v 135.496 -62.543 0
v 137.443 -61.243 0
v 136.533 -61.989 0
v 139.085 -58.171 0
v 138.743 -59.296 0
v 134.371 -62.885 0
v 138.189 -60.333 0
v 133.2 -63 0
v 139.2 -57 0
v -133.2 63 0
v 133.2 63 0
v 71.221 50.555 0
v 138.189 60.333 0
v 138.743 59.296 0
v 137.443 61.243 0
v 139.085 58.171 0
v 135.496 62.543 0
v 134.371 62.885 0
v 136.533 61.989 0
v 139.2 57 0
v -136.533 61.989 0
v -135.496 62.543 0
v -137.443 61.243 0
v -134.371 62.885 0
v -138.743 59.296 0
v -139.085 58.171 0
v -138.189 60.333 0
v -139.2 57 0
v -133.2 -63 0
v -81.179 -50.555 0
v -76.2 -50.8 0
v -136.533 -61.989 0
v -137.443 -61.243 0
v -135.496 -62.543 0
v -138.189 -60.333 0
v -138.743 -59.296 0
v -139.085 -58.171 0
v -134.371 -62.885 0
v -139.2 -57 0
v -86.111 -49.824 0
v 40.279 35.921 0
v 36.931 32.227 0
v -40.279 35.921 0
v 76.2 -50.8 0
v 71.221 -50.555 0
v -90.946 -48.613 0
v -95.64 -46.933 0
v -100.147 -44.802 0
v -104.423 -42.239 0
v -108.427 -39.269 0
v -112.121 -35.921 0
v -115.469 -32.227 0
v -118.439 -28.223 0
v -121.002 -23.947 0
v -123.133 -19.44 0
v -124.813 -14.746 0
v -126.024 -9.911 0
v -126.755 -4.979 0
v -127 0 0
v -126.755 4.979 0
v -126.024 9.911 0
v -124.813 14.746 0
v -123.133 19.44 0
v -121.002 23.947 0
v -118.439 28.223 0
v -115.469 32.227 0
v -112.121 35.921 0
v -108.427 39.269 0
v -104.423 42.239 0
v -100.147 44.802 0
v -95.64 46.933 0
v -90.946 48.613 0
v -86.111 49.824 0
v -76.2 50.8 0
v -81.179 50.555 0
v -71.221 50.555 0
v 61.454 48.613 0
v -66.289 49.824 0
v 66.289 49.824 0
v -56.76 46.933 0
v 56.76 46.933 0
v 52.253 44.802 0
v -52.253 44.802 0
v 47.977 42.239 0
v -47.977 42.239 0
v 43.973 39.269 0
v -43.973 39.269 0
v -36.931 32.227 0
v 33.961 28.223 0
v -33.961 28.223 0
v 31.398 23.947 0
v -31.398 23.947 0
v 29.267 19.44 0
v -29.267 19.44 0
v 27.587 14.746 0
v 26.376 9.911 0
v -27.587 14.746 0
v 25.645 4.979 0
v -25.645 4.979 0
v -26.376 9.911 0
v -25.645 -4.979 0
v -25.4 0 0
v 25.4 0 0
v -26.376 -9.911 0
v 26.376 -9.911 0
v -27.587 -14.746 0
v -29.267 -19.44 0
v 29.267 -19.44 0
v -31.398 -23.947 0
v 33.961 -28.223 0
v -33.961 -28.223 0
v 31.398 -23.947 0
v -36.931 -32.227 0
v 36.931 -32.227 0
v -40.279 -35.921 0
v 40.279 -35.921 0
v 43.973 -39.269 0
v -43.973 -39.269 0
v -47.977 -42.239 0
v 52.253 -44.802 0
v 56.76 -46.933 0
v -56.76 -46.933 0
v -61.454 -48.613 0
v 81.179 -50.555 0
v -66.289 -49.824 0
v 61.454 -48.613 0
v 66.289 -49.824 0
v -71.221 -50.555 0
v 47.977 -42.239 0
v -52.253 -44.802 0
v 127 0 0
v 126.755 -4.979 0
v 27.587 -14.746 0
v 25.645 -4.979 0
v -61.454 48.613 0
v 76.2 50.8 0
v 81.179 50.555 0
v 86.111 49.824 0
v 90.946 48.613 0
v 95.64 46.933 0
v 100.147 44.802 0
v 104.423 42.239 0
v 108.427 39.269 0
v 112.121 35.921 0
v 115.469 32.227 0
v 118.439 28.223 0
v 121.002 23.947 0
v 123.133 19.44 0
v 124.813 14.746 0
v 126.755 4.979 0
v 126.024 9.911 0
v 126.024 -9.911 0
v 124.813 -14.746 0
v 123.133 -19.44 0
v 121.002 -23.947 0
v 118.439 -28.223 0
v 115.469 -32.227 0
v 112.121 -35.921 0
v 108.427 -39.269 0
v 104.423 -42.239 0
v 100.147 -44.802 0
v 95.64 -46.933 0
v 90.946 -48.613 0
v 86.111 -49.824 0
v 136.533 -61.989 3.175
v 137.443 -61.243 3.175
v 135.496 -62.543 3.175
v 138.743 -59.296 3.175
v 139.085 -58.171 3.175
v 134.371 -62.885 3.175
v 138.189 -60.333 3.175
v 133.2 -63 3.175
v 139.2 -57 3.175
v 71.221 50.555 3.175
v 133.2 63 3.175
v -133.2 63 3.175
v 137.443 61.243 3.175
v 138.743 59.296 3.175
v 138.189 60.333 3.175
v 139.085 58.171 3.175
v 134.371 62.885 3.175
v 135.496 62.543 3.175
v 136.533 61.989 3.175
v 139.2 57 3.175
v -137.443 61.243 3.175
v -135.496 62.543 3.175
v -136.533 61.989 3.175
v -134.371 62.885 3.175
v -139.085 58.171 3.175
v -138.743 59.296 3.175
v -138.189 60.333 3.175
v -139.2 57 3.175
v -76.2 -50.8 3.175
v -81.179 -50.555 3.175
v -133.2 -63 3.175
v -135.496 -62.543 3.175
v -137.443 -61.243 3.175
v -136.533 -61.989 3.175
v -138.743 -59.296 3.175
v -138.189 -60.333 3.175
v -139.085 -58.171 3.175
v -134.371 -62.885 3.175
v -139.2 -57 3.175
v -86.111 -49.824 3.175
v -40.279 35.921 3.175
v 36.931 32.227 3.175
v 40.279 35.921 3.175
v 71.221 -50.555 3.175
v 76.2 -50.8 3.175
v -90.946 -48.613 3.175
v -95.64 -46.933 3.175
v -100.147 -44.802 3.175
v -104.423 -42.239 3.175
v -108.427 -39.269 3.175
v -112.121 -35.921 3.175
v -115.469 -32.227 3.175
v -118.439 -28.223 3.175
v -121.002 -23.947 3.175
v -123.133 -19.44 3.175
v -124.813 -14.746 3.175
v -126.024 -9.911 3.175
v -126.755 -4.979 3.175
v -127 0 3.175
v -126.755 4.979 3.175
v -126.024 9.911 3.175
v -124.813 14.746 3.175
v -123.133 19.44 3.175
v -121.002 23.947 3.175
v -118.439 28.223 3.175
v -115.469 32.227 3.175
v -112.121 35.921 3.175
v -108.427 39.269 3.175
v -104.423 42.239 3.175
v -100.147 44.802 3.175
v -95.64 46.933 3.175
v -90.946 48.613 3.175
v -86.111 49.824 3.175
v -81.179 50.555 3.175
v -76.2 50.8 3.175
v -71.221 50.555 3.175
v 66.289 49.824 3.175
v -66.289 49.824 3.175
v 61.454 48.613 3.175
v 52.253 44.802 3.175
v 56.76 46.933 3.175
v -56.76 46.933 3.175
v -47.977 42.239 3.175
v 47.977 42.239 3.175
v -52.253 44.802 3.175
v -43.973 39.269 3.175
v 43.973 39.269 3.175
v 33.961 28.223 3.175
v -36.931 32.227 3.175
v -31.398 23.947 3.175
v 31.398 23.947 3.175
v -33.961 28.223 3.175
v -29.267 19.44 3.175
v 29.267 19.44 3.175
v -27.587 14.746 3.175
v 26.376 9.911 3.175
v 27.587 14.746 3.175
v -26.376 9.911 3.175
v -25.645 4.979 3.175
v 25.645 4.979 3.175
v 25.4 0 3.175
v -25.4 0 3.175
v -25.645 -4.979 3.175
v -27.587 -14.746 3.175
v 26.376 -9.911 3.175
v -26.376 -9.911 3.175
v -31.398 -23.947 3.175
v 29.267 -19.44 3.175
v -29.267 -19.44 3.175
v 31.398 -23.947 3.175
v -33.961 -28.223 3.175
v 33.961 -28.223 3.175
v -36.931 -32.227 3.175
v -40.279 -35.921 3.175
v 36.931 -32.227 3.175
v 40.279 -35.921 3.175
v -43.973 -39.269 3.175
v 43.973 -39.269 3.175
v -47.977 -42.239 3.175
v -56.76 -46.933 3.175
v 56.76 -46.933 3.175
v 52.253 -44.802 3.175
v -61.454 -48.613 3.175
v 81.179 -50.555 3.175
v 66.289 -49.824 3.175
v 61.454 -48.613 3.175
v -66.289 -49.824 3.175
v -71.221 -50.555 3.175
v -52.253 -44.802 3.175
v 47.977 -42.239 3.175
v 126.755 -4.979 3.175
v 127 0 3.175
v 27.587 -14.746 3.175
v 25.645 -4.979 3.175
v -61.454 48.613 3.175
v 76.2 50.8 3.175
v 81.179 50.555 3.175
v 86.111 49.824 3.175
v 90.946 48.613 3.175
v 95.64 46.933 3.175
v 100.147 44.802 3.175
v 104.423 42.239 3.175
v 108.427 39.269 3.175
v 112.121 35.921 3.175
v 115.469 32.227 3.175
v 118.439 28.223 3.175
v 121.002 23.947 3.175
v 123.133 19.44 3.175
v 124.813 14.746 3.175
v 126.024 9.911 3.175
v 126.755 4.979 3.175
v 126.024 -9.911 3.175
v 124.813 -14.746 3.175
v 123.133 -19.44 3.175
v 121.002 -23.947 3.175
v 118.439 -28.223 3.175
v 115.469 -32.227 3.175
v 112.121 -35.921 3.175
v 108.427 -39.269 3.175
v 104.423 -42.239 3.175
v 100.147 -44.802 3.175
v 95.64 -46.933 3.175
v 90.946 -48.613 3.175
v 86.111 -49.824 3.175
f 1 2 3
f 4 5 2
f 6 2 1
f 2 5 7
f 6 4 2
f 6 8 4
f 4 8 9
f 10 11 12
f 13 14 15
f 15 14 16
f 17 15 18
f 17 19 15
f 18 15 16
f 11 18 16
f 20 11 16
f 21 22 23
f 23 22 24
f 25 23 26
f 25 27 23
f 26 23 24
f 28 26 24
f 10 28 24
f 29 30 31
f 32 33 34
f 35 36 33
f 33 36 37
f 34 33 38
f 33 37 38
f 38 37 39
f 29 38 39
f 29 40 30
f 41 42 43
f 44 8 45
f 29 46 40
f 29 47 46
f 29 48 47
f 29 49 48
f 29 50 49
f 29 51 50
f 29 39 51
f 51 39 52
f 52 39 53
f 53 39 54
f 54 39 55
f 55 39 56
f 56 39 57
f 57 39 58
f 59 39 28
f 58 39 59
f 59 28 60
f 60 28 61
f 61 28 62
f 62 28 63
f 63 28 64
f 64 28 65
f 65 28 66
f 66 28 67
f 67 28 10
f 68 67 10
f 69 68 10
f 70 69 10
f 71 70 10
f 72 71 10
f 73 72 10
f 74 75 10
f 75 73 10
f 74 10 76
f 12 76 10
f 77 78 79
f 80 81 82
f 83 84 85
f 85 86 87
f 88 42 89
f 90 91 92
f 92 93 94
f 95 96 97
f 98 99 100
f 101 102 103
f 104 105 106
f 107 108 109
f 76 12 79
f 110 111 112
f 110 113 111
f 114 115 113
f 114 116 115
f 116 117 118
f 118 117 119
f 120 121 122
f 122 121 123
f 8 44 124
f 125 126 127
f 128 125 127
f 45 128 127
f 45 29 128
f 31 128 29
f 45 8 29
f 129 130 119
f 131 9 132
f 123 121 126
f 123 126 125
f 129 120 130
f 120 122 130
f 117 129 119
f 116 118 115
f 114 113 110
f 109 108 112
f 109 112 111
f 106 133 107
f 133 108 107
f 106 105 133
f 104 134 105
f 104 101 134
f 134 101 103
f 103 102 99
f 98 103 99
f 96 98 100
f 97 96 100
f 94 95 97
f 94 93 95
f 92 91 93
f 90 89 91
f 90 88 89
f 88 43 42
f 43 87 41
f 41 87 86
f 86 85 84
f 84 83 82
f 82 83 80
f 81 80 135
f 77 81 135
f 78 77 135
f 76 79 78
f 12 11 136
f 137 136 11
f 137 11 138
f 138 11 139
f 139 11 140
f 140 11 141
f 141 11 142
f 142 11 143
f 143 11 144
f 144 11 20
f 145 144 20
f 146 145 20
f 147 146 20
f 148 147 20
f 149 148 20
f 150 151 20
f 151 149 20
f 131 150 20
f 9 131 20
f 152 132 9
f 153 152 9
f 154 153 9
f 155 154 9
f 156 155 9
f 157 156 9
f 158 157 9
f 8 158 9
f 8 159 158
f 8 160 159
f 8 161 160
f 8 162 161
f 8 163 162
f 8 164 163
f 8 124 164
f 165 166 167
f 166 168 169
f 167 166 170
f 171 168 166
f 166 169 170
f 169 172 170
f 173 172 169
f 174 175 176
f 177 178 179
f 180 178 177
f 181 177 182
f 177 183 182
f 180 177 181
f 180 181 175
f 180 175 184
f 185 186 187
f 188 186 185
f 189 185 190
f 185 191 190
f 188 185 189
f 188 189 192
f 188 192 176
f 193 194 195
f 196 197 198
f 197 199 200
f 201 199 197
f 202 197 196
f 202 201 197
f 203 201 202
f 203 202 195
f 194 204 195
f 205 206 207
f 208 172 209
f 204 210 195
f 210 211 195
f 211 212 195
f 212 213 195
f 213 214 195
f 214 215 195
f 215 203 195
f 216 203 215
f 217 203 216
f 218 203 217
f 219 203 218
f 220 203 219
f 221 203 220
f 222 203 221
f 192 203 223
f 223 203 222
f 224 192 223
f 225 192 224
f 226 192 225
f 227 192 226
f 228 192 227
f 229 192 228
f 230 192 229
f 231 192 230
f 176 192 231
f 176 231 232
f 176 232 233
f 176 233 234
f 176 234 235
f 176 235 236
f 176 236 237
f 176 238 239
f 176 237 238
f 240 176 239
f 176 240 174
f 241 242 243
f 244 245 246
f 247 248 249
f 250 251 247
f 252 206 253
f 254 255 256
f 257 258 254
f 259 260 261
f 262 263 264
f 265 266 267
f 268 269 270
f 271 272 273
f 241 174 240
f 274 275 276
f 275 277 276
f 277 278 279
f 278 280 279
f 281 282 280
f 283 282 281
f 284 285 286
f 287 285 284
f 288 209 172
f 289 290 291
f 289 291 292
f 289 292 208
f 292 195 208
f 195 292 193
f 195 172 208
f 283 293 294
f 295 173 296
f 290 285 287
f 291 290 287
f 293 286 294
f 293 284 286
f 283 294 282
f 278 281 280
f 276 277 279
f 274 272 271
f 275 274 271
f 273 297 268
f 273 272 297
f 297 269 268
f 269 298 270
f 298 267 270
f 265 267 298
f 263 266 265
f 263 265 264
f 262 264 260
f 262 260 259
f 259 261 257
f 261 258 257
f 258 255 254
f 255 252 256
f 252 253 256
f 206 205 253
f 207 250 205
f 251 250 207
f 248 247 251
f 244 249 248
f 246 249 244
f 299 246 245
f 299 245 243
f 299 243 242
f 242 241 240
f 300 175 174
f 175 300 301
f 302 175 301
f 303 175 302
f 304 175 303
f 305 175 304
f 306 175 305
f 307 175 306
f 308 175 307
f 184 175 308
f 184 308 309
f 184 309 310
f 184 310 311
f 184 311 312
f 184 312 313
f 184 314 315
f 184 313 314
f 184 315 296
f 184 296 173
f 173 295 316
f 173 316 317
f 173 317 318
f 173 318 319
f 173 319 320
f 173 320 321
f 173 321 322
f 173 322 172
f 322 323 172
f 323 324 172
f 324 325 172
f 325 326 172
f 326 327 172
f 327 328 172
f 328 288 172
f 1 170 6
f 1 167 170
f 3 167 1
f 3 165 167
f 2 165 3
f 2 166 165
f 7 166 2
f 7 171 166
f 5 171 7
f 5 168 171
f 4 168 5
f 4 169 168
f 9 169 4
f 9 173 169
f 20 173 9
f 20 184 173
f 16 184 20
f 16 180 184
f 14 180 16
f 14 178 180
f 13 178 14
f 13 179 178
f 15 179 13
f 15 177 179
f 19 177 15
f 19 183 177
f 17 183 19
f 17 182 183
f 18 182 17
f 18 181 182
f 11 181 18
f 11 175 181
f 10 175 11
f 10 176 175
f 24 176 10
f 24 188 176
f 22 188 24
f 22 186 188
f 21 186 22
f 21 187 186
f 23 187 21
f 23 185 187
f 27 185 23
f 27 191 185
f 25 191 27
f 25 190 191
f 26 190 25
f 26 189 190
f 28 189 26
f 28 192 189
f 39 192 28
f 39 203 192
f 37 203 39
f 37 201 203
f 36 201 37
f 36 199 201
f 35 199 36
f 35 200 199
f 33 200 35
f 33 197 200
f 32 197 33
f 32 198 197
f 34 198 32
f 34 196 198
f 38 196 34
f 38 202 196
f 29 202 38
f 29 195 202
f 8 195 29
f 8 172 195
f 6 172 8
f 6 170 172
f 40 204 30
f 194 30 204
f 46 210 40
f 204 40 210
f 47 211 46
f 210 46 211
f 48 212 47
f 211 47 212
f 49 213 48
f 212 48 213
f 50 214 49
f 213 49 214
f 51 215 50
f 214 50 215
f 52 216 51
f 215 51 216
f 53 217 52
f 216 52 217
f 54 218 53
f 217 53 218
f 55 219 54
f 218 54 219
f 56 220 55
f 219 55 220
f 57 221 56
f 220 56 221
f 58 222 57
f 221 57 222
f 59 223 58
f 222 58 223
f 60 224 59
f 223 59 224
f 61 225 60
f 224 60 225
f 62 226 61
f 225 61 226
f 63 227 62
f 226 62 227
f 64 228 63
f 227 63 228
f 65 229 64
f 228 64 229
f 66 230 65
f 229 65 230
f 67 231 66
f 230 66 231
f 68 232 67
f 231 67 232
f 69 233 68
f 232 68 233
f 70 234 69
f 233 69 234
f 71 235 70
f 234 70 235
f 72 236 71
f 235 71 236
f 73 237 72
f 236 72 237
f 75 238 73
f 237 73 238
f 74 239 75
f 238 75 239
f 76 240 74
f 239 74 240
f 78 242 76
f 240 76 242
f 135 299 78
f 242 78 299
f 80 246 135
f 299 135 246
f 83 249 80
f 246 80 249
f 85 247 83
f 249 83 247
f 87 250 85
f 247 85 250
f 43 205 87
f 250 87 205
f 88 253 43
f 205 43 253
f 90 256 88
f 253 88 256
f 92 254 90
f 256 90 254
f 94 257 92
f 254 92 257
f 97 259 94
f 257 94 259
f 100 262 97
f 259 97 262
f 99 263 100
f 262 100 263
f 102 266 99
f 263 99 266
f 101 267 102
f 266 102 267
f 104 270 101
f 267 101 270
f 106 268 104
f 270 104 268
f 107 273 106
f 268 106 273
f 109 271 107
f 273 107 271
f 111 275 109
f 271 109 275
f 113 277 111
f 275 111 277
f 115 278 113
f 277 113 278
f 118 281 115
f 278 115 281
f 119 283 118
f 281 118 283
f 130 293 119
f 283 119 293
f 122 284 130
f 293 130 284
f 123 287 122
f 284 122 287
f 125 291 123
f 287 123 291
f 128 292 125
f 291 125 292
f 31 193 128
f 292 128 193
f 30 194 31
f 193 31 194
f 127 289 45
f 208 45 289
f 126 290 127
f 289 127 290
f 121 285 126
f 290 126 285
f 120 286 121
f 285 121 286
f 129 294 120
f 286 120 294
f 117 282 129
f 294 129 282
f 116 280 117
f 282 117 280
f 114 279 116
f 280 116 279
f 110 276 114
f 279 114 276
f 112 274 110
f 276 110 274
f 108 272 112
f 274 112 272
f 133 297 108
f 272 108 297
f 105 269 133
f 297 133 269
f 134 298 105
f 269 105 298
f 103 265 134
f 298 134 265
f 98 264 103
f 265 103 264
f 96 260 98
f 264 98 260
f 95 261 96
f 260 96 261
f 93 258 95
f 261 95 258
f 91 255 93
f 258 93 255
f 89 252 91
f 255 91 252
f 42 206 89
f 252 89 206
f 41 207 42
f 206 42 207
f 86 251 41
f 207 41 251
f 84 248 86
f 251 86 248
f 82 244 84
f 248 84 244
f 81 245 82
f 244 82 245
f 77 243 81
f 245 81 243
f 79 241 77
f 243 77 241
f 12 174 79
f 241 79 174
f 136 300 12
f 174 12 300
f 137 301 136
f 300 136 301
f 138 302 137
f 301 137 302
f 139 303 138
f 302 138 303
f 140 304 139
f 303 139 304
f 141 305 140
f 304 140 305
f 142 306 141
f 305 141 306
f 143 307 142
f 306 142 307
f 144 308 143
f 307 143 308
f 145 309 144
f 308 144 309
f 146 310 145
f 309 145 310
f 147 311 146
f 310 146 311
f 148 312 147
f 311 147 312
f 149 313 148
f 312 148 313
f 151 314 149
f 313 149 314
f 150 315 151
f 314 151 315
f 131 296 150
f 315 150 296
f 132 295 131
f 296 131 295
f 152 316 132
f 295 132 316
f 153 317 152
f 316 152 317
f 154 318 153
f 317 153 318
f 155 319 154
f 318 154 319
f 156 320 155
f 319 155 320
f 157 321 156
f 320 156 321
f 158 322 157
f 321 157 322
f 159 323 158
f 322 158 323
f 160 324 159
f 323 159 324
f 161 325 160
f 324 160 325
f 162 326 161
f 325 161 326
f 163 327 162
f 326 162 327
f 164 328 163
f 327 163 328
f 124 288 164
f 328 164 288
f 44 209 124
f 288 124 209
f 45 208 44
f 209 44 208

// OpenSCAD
// file: ../lib/DbgCtxStrLib1.scad
// DbgCtxStrLib1.0
// 
// Library for dealing with 'debug context strings' (usually 'dbgctxstr').

function dbgctxstr_errmsg_suffix(dbgctxstr) =
	is_undef(dbgctxstr) || dbgctxstr == "" ? "" :
	str(" (", dbgctxstr, ")");
// file: ../lib/TOGArrayLib1.scad
// TOGArrayLib1.5
// 
// Functions for working with arrays.
// 
// v1.1:
// - tal1_reduce assert(is_list(items)) to prevent infinite recursion
//   when given undefined or other non-list values
// v1.1.1:
// - Fix tal1_uniq_remap_v2 to return "list-remap-result" as the
//   first element of the returned list
// v1.2:
// - Add tal1_replace_at function
// v1.3:
// - tal1_is_vec_of, tal1_is_vec_of_num
// v1.4:
// - tal1_assert_for_each, for when you want to assert something
//   about each of a list of items and get nice failure messages
// v1.5:
// - Add tal1_duplicate_reversed function, which may be
//   handy when generating symmetrical polygons and stuff.

/**
 * Make a list with the contents of list `a`,
 * but starting at offset `off`, replaced by the contents of list `b`.
 * len(result) = max(len(a), off+len(b))
 */
function tal1_replace_at(a, off, b, default_value=undef, default_value_function=undef) =
	assert(is_list(a))
	assert(is_list(b))
	let( _dvf = !is_undef(default_value_function) ? default_value_function : function(i) default_value )
[
	for( i=[0:1:min(off,len(a))-1] ) a[i],
	for( i=[len(a):1:off-1] ) _dvf(i),
	for( i=[off:1:off+len(b)-1] ) b[i-off],
	for( i=[off+len(b):1:len(a)-1] ) a[i],
];

// Simplest case
assert([] == tal1_replace_at([], 0, []));
// Second simplest cases
assert(["foo"] == tal1_replace_at(["foo"], 0, []));
assert(["foo"] == tal1_replace_at([], 0, ["foo"]));
// Replace one item
assert(["foo","quux","baz"] == tal1_replace_at(["foo","bar","baz"], 1, ["quux"]));
// Replace and extend
assert(["foo","quux","tuna","tina"] == tal1_replace_at(["foo","bar","baz"], 1, ["quux", "tuna", "tina"]));
// Add beyond end of `a`
assert(["foo","zzz","quux"] == tal1_replace_at(["foo"], 2, ["quux"], default_value="zzz"));
// Adding 'nothing' should still fill to that point with defaults
assert(["foo","zzz","zzz"] == tal1_replace_at(["foo"], 3, [], default_value="zzz"));


function tal1_reduce(start, items, func, offset=0) =
	assert(is_list(items))
	len(items) == offset ? start :
	tal1_reduce(func(start, items[offset]), items, func, offset+1);

function tal1_consecutive_duplicate_count(items) = tal1_reduce(
	[0, undef],
	items,
	function(z,item) [z[0] + (item == z[1] ? 1 : 0), item]
)[0];

assert(0 == tal1_consecutive_duplicate_count([]));
assert(0 == tal1_consecutive_duplicate_count([50]));
assert(1 == tal1_consecutive_duplicate_count([50,50]));
assert(0 == tal1_consecutive_duplicate_count([50,51,52,53]));
assert(1 == tal1_consecutive_duplicate_count([50,51,52,52]));
assert(3 == tal1_consecutive_duplicate_count([50,50,50,50]));

// Set test_size to arbirarily large values
// to ensure that OpenSCAD can handle heavy recursion
let(test_size=1000) assert(test_size/2 == tal1_consecutive_duplicate_count([for(i=[0:1:test_size-1]) floor(i/2)]));



function tal1_uniq_(items, off0, off1) =
	let(chunklen = off1-off0)
	chunklen == 0 ? [] :
	chunklen == 1 ? [items[off0]] :
	let(half=floor(chunklen/2))
	let(left  = tal1_uniq_(items, off0     , off0+half))
	let(right = tal1_uniq_(items, off0+half, off1     ))
	assert(len(left) > 0)
	assert(len(right) > 0)
	left[len(left)-1] == right[0] ? [each left, for(i=[1:1:len(right)-1]) right[i]] :
	[each left, each right];

/** Given a list of items, returns a new list with identical consecutive items merged */
function tal1_uniq(items) = tal1_uniq_(items, 0, len(items));

assert([] == tal1_uniq([]));
assert([123] == tal1_uniq([123]));
assert([55,0,1,2,3] == tal1_uniq([55,0,1,2,3]));
assert([55,0,1,2] == tal1_uniq([55,0,1,1,2]));
assert([55,0,1] == tal1_uniq([55,55,0,0,0,0,0,0,1,1,1,1]));
assert([55,0] == tal1_uniq([55,0,0,0,0,0,0,0]));



/**
 * Returns [new items, old index -> new index mapping].
 * No-op version.
 */
function tal1_uniq_remap_v1(items) =
	["list-remap-result", items, [for (vi=[0:1:len(items)-1]) vi]];

// [a, a, b, b, c, c]
//
// [a,    ...], []  -> [a],[0]
// [a, a, ...], [0] -> [a],[0,0]

assert([1,2,3] == [1,2,3]);

/**
 * Recursive version that will combine adjacent identical vertexes,
 * but will use the original items.
 */
function tal1_uniq_remap_v2(items, map=[]) =
	let(index = len(map))
	len(items) == index ? ["list-remap-result", items, map] :
	index == 0 ? tal1_uniq_remap_v2(items, [0]) :
	items[index] == items[map[index-1]] ? tal1_uniq_remap_v2(items, [for(vi=map) vi, map[index-1]]) :
	tal1_uniq_remap_v2(items, [for(vi=map) vi, index]);

assert(tal1_uniq_remap_v2([1,1,2,2,3,4]) == ["list-remap-result", [1,1,2,2,3,4], [0,0,2,2,4,5]]);


/**
 * Returns true if `vec` is a list of at least min_len items
 * and component_check(each item, even those beyond min_len) is true.
 */
function tal1_is_vec_of(vec, min_len=0, component_check=function(x) true) =
	assert(is_num(min_len) && min_len >= 0)
	assert(is_function(component_check))
	is_list(vec) && len(vec) >= min_len &&
	tal1_reduce(true, vec, function(prev,item) prev && component_check(item));

function tal1_is_vec_of_num(vec, min_len=0) = tal1_is_vec_of(vec, min_len, function(i) is_num(i));

assert( true == tal1_is_vec_of_num([1,2,3]));
assert( true == tal1_is_vec_of_num([]));
assert( true == tal1_is_vec_of_num([1,2,3], 3));
assert(false == tal1_is_vec_of_num([1,2], 3));
assert(false == tal1_is_vec_of_num([1,2,"spoon"], 3));
// Requirements are ambiguous when
// first min_len items are numbers, but there are non-numeric items afterwards,
// so let's error on the side of saying 'no, it's not a list of numbers';
// i.e. the item check and the min_len are independent.
assert(false == tal1_is_vec_of_num([1,2,3,"artichoke"], 3));


/**
 * Asserts that item_checker(each item in list, index of item)[0] is true.
 * Second element of item_checker return value is assertion message.
 * Returns the original list, in case that's useful to you.
 */
function tal1_assert_for_each(list, item_checker) =
	let( _ignored = [ for(i=[0:1:len(list)-1])
		let(q=item_checker(list[i],i))
		let(passed=is_bool(q) ? q : is_list(q) ? q[0] : assert(false, str(
			"tal1_assert_for_each: item_checker should return Bool|[Bool,String], but returned ",
			q, " for item at index ", i)))
		let(message=is_list(q) ? q[1] : undef)
		assert(passed, message)
		q
	])
	list;

// Callback can return a boolean...
assert([1,2,3] == tal1_assert_for_each([1,2,3], function(v,i) is_num(v)));
// ...or a [boolean, string]
assert([1,2,3] == tal1_assert_for_each([1,2,3], function(v,i) [is_num(v), "element be a num"]));

// [a, b, c] -> [a, b, c, rxf(c), rxf(b), rxf(a)]
function tal1_duplicate_reversed(list, rxf=function(item) item) =
	[
		each list,
		for( i=[len(list)-1 : -1 : 0] ) rxf(list[i]),
	];
// file: ../lib/TOGUnitTable-v1.scad
// TOGUnitTable-v1.1.0 - Library for handling 'complex amounts' in the form of [multiplier, unit name], e.g. [1.5, "inch"]
//
// 2023-07-01: the following 'annotation' is something I just made up,
// but is intended as a way for future packaging tools to know that it's 'safe'
// (because everything has been somewhat namespaced) to turn a `use <x>`
// into an `include <x>`, making it inlinable:
// safe-to-include: true
// 
// Versions:
// v1.0.0:
// - Created it.
// v1.1.0:
// - Add optional 'dbgctxstr' parameter to unit decoding functions, for better error messages
// 
// Naming convention:
// Doing 'OO without classes', here.
// Fully qualified name = class or package name + "__" + member name
// Class or package name may itself be namespaced, and class names may double as package names.
// Here, tog_unittable names both a class and a package.

// Demo unit table uses 'micrometer' as the base unit
// in order to keep multipliers as integers as much as possible.
tog_unittable__demo_unit_table = [
	["um",    [    1   ,   "um"], "micrometer" ],
	["mm",    [ 1000   ,   "um"], "millimeter" ],
	["inch",  [25400   ,   "um"], "inch"       ],
	["u",     [    1/16, "inch"], "model unit" ], // As used by TGx9 et al
	["atom",  [    8   ,    "u"], "model atom" ],
	["chunk", [    3   , "atom"], "model chunk"],
];

use <./DbgCtxStrLib1.scad>

function tog_unittable__list__filter(list, predicate) = [
	for( item=list ) if( predicate(item) ) item
];
function tog_unittable__list__first(list, on_error) =
	len(list) > 0 ? list[0] : on_error();

function tog_unittable__unit_value_ca(unit_table, unit_name, dbgctxstr=undef) =
	tog_unittable__list__first(
		tog_unittable__list__filter(unit_table, function (entry) entry[0] == unit_name),
		function () assert(false,
			str("Did not find entry for unit '", unit_name, "' in unit table", dbgctxstr_errmsg_suffix(dbgctxstr))
		)
	)[1];

function tog_unittable__ca__is_valid( ca ) =
	is_list(ca) && len(ca) == 2;

// Break down 'amount' until it is in a base unit (one which is defined in terms of itself)
function tog_unittable__simplify_ca(unit_table, amount, dbgctxstr=undef) =
	assert( tog_unittable__ca__is_valid(amount), str(amount, " is not a valid Complex Amount (should be [numeric_value, \"unit_name\"])", dbgctxstr=dbgctxstr) )
	let( unit_value_ca = tog_unittable__unit_value_ca(unit_table, amount[1], dbgctxstr=dbgctxstr) )
	unit_value_ca[1] == amount[1] ? amount :
		tog_unittable__simplify_ca(unit_table, [amount[0] * unit_value_ca[0], unit_value_ca[1]]);

function tog_unittable__divide_ca(unit_table, numerator, denominator, dbgctxstr=undef) =
	let(
		numerator_base_ca   = tog_unittable__simplify_ca(unit_table, numerator, dbgctxstr=dbgctxstr),
		denominator_base_ca = tog_unittable__simplify_ca(unit_table, denominator, dbgctxstr=dbgctxstr)
	)
	assert(numerator_base_ca[1] == denominator_base_ca[1], str("Different base units found for ", numerator[1], " and ", denominator[1]))
	numerator_base_ca[0] / denominator_base_ca[0];	

assert(tog_unittable__divide_ca(tog_unittable__demo_unit_table, [1,   "mm"], [  1, "mm"]) ==     1   );
assert(tog_unittable__divide_ca(tog_unittable__demo_unit_table, [1,   "mm"], [  1, "um"]) ==  1000   );
assert(tog_unittable__divide_ca(tog_unittable__demo_unit_table, [1, "inch"], [  1, "um"]) == 25400   );
assert(tog_unittable__divide_ca(tog_unittable__demo_unit_table, [1, "inch"], [  1, "mm"]) ==    25.4 );
assert(tog_unittable__divide_ca(tog_unittable__demo_unit_table, [1, "inch"], [254, "um"]) ==   100   );
assert(tog_unittable__divide_ca(tog_unittable__demo_unit_table, [1,    "u"], [  1, "um"]) ==  1587.5 );
// file: ../lib/TOGMod1Constructors.scad
// TOGMod1Constructors-v1.11
// 
// Functions to construct objects understood by TOGMod1
// 
// v1.1:
// - Add togmod1_make_rounded_rect
// v1.2:
// - togmod1_make_rounded_rect can make ovals
// v1.3:
// - togmod1_circle_points, to just get the points of a circle
// - if pos parameter to circle function has a third element,
//   returned vertexes will include it as the z component;
// v1.3.1
// - Some assertions
// v1.4:
// - Refactor togmod1_rounded_rect_points and togmod1_circle_points
//   to use togmod1__make_nd_vector_adder for adapting to whatever
//   `pos` parameter is.
// v1.5:
// - togmod_rounded_rect_points will not simplify completely rounded sides
//   (where length of side is exactly twice the rounding radius)
//   unless simplify_rounded_sides=true
//   - This makes it more useful for polyhedron generation,
//     where radius varies, but number of points must remain constant.
// v1.6:
// - togmod1_make_rect makes a simple rectangle
// - togmod1_make_rounded_rect will defer to togmod1_make_rect when r=0
// v1.7:
// - togmod1_make_circle will return empty shape (["union"]) when d=0
// v1.8:
// - Add togmod1_text
// v1.9:
// - togmod1_circle_points uses 3 as minimum circle point count instead of 6
// v1.10:
// - Fix togmod1_linear_extrude_y so that range corresponds to Y start/end and
//   polygon X,Y correspond to X,Z.  Previously it was rotated wrongly,
//   which would have gone unnoticed for symmetrical shapes centered at 0,0.
// v1.11:
// - Remove an 'echo'

use <./TOGArrayLib1.scad>

function togmod1__make_nd_vector_adder(origin=[0,0]) =
	let(origin_is_zero = tal1_reduce(true, origin, function(prev,item) prev && item == 0))
	origin_is_zero ? (function(vec) len(vec) >= len(origin) ? vec : tal1_replace_at(origin, 0, vec)) :
	function(vec) [
		for(i=[0:1:max(len(origin),len(vec))-1]) (len(vec) > i ? vec[i] : 0) + (len(origin) > i ? origin[i] : 0),
	];

assert([1,2,3] == togmod1__make_nd_vector_adder()([1,2,3]));
assert([1,2,3] == togmod1__make_nd_vector_adder([0,0,3])([1,2]));


function togmod1_make_cuboid(size) =
	assert(is_list(size))
	assert(len(size) >= 3)
	assert(is_num(size[0]))
	assert(is_num(size[1]))
	assert(is_num(size[2]))
	["polyhedron-vf", [
		[-size[0]/2, -size[1]/2, -size[2]/2],
		[+size[0]/2, -size[1]/2, -size[2]/2],
		[-size[0]/2, +size[1]/2, -size[2]/2],
		[+size[0]/2, +size[1]/2, -size[2]/2],
		[-size[0]/2, -size[1]/2, +size[2]/2],
		[+size[0]/2, -size[1]/2, +size[2]/2],
		[-size[0]/2, +size[1]/2, +size[2]/2],
		[+size[0]/2, +size[1]/2, +size[2]/2]
	], [
		[0,1,3,2],[0,4,5,1],[4,6,7,5],[3,7,6,2],[1,5,7,3],[6,4,0,2]
	]];

function togmod1_make_polygon(verts) =
	["polygon-vp", verts, [[for( i=[0:1:len(verts)-1] ) i%len(verts)]]];

function togmod1_rounded_rect_points(size, r, pos=[0,0], simplify_rounded_sides=false) =
	assert(is_list(size))
	assert(len(size) >= 2)
	let(radii = is_list(r) ? r : is_num(r) ? [r,r] : assert(false, "rounded_rect r(adius) should be list<num> or num"))
	let(rx = radii[0])
	let(ry = radii[1])
	assert(is_num(rx))
	assert(is_num(ry))
	assert(size[0] >= 2*rx, str("size[0] must be >= 2*r[0]; size[0] = ",size[0],", 2*r[0] = ",2*rx))
	assert(size[1] >= 2*ry, str("size[1] must be >= 2*r[1]; size[1] = ",size[1],", 2*r[1] = ",2*ry))
	let(quarterfn=max($fn/4, 1))
	let(qfnx = simplify_rounded_sides && size[0] == 2*rx ? quarterfn-1 : quarterfn)
	let(qfny = simplify_rounded_sides && size[1] == 2*ry ? quarterfn-1 : quarterfn)
	let(finalizepos = togmod1__make_nd_vector_adder(pos))
[
	for(a=[0 : 1 : qfnx]) let(ang=      a*90/quarterfn) finalizepos([ size[0]/2-rx + rx*cos(ang),  size[1]/2-ry + ry*sin(ang)]),
	for(a=[0 : 1 : qfny]) let(ang= 90 + a*90/quarterfn) finalizepos([-size[0]/2+rx + rx*cos(ang),  size[1]/2-ry + ry*sin(ang)]),
	for(a=[0 : 1 : qfnx]) let(ang=180 + a*90/quarterfn) finalizepos([-size[0]/2+rx + rx*cos(ang), -size[1]/2+ry + ry*sin(ang)]),
	for(a=[0 : 1 : qfny]) let(ang=270 + a*90/quarterfn) finalizepos([ size[0]/2-rx + rx*cos(ang), -size[1]/2+ry + ry*sin(ang)]),
];

function togmod1_make_rect(size) =
	togmod1_make_polygon([
		[-size[0]/2, -size[1]/2],
		[+size[0]/2, -size[1]/2],
		[+size[0]/2, +size[1]/2],
		[-size[0]/2, +size[1]/2],
	]);

function togmod1_make_rounded_rect(size, r) =
	r == 0 ? togmod1_make_rect(size) :
	togmod1_make_polygon(togmod1_rounded_rect_points(size,r,simplify_rounded_sides=true));

/**
 * Returns points for an approximation of a circle where points are at distance r from pos.
 * Can be used to make other regular polygons, but the faces will be less than that
 * distance from pos (do some trig if you want face distance, e.g. for a hex nut).
 */
function togmod1_circle_points(r, pos=[0,0], d=undef) =
	assert( !is_undef(r) || !is_undef(d) )
	assert(!is_undef(pos[0]))
	assert(!is_undef(pos[1]))
	let(finalizepos = togmod1__make_nd_vector_adder(pos))
	let(r_ = !is_undef(r) ? r : d/2)
	let(fn = max($fn, 3))
	[for(i=[0 : 1 : fn-1]) finalizepos([r_*cos(i*360/fn), r_*sin(i*360/fn)])];

function togmod1_make_circle(r, pos=[0,0], d=undef) =
	r == 0 || d == 0 ? ["union"] :
	togmod1_make_polygon(togmod1_circle_points(r=r, pos=pos, d=d));

function togmod1_make_cylinder(d, zrange=[0,1], r=undef, pos=[0,0]) =
	assert( !is_undef(r) || !is_undef(d) )
	let( r_ = !is_undef(r) ? r : d/2 )
	// TODO: Make polyhedron directly
	["linear-extrude-zs", zrange, togmod1_make_circle(r=r_, pos=pos)];

function togmod1__is_range1d(range) = is_list(range) && len(range) == 2 && is_num(range[0]) && is_num(range[1]);

function togmod1_linear_extrude_z(range, shape) =
	assert(togmod1__is_range1d(range))
	["linear-extrude-zs", range, shape];
function togmod1_linear_extrude_x(range, shape) =
	assert(togmod1__is_range1d(range))
	["rotate", [90, 0, 90], togmod1_linear_extrude_z(range, shape)];
function togmod1_linear_extrude_y(range, shape) =
	assert(togmod1__is_range1d(range))
	["rotate", [90, 0,  0], togmod1_linear_extrude_z([-range[1], -range[0]], shape)];

function togmod1_text(text, size, font, halign, valign, spacing, direction, language, script) =
	["text-tsfhvsdls", text, size, font, halign, valign, spacing, direction, language, script];
// file: ../lib/TOGMod1.scad
// TOGMod1.9
// OpenSCAD library for representing shapes
// 
// See also: Functional OpenSCAD (https://github.com/thehans/FunctionalOpenSCAD)
// 
// v1.8:
// - Add `text-tsfhvsdls`
// v1.9
// - Add `offset-ds` (offset with _d_elta a _s_hape)

module togmod1_domodule(mod) {
	assert(is_list(mod));
	assert(len(mod) > 0);
	if( mod[0] == "polygon-vp" ) {
		// ["polygon-vp", vertexes, paths]
		polygon(points=mod[1], paths=mod[2]);
	} else if( mod[0] == "polyhedron-vf" ) {
		polyhedron(mod[1], faces=mod[2]);
	} else if( mod[0] == "scale" ) {
		assert(len(mod) == 3);
		scale(mod[1]) togmod1_domodule(mod[2]);
	} else if( mod[0] == "translate" ) {
		assert(len(mod) == 3);
		assert(is_list(mod[1]));
		for(c=mod[1]) assert(is_num(c), "translate component should be numeric");
		translate(mod[1]) togmod1_domodule(mod[2]);
	} else if( mod[0] == "rotate" ) {
		assert(len(mod) == 3);
		rotate(mod[1]) togmod1_domodule(mod[2]);
	} else if( mod[0] == "intersection" ) {
		intersection_for( i=[1:1:len(mod)-1] ) togmod1_domodule(mod[i]);
	} else if( mod[0] == "difference" ) {
		difference() {
			togmod1_domodule(mod[1]);
			for( i=[2:1:len(mod)-1] ) togmod1_domodule(mod[i]);
		}
	} else if( mod[0] == "union" ) {
		for( i=[1:1:len(mod)-1] ) togmod1_domodule(mod[i]);
	} else if( mod[0] == "hull" ) {
		hull() for( i=[1:1:len(mod)-1] ) togmod1_domodule(mod[i]);
	} else if( mod[0] == "offset-rs" ) {
		assert(len(mod) == 3);
		assert(is_num(mod[1]));
		assert(is_list(mod[2]));
		offset(mod[1]) togmod1_domodule(mod[2]);
	} else if( mod[0] == "linear-extrude-zs" ) {
		// ["linear-extrude-zs", [z0,z1], 2d_shape] // centered
		// ["linear-extrude-zs", height, 2d_shape]
		let( zrange = is_list(mod[1]) ? mod[1] : [-mod[1]/2, mod[1]/2] ) {
			translate([0,0,zrange[0]]) linear_extrude(zrange[1]-zrange[0]) togmod1_domodule(mod[2]);
		}
	} else if( mod[0] == "render" ) {
		render() togmod1_domodule(mod[1]);
	} else if( mod[0] == "minkowski" ) {
		minkowski() {
			togmod1_domodule(mod[1]);
			togmod1_domodule(mod[2]);
		}
	} else if( mod[0] == "x-debug" ) {
		# togmod1_domodule(mod[1]);
	} else if( mod[0] == "x-color" ) {
		color(mod[1]) togmod1_domodule(mod[2]);
	} else if( mod[0] == "text-tsfhvsdls" ) {
		text(text=mod[1], size=mod[2], font=mod[3], halign=mod[4], valign=mod[5], spacing=mod[6], direction=mod[7], language=mod[7], script=mod[8]);
	} else if( mod[0] == "offset-ds" ) {
		assert(is_num(mod[1]));
		assert(is_list(mod[2]));
		offset(delta=mod[1]) togmod1_domodule(mod[2]);
	} else {
		assert(false, str("Unrecognized shape: ", mod[0]));
	}
}
// file: ../lib/TOGridLib3.scad
// TOGridPileLib-v3.4
// 
// HOKAY WHAT ARE THE COMMON
// things that I want the library to do?
// 
// - [X] Be `include`-able, to make inlining easy
// - [X] Allow unit table to be overridden easily, but default by default
// - [ ] Support common configurations by name (e.g. "V9", or some "WSTYPE-...")
//   without having to pass 50 different parameters in
// - [ ] Support subtractions for those common configurations also,
//   such that you don't need to remember to 'do less rounding', etc.
// - [ ] Make a simple foot-only block that I can subtract stuff from
//   params: foot style
// - [ ] Make a block with a lip
// - [ ] Make a block foot, and I'll intersect it with some other things
// - [X] Translate a block_size_ca to mm
// 
// Changes:
// v3.1:
// - s/togridpile3_decode_size/togridpile3_decode_vector/
// v3.2:
// - togridpile3_decode(num) = num
// v3.3:
// - Change prefix from `togridpile3` to `togridlib3`
// v3.4:
// - Add optional 'dbgctxstr' parameter to unit decoding functions, for better error messages

use <../lib/TOGUnitTable-v1.scad>

function togridlib3_map(arr, fn) = [ for(item=arr) fn(item) ];

togridlib3_default_unit_table = [
	["um",    [    1,               "um"]],
	["mm",    [ 1000,               "um"]],
	["inch",  [25400,               "um"]],
	["u",     [    1.5875,          "mm"]],
	["atom",  [    8,                "u"]],
	["chunk", [    3,             "atom"]],
	["tgp-standard-bevel"   , [2,    "u"]], // Usuually 1/8"
	["m-outer-corner-radius", [4,    "u"]],
	["f-outer-corner-radius", [3,    "u"]],
];

function togridlib3_get_default_unit_table() = togridlib3_default_unit_table;
function togridlib3_get_unit_table() = is_undef($togridlib3_unit_table) ? togridlib3_default_unit_table : $togridlib3_unit_table;

function togridlib3_decode(dim, unit=[1, "mm"], unit_table=togridlib3_get_unit_table(), dbgctxstr=undef) =
	is_num(dim) ? dim : tog_unittable__divide_ca(unit_table, dim, unit, dbgctxstr=dbgctxstr);
function togridlib3_decode_vector(size, unit=[1, "mm"], unit_table=togridlib3_get_unit_table(), dbgctxstr=undef) =
	togridlib3_map(size, function(dim) is_num(dim) ? dim : tog_unittable__divide_ca(unit_table, dim, unit, dbgctxstr=dbgctxstr));

module togridlib3_cube(size, offset=0) {
	cube(togridlib3_decode_vector(size), center=true);
}
// main file
// NetPotPanel0.1
// 
// Panel to sit inside TerrariumSegment0
// and hold a couple of 4" netpots.

// Size of panel in 1/2"; this should be the size of a terrarium segment minus two in each dimension
panel_size_atoms = [22,10];
// Extra subtraction around the outer edges to make room for bumps and wiggles
panel_margin = 0.5;
panel_thickness = 3.175;

use <../lib/TOGridLib3.scad>
use <../lib/TOGMod1.scad>
use <../lib/TOGMod1Constructors.scad>

module netpotpanel0__end_params() { }

$togridlib3_unit_table = togridlib3_get_default_unit_table();
$fn = 32;

// Outer dimensions should be dimension of terrarium segment - 2 * (1/2 inch + 0.4 * inch).
// The 0.4 is from the walls of the terrarium segments actually incurring
// into the interior by that much, since the concave bits start at 7/16" in from the
// outside and are 2mm thick (not taking into account an additional -0.1mm offset,
// which is really just there to appease the CGAL engine.

function netpotpanel0_outer_to_panel_dim(x) =
	let( terrarium_wall_thickness = togridlib3_decode([7/8, "atom"]) + 2 )
	let( extra_margin = 0.1 )
	x - 2 * (terrarium_wall_thickness + extra_margin);

function netpotpanel0_make_panel(size_ca, panel_margin=0, thickness=3.175) =
	let( inch = 25.4 )
	let( actual_size = [for(d=togridlib3_decode_vector(size_ca)) d - panel_margin * 2] )
	let( cell_size = 6*inch )
	let( grid_size_cells = [for(d=actual_size) round(d/cell_size)] )
	echo( grid_size_cells=grid_size_cells )
	let( netpot_hole = togmod1_make_circle(d=4*inch, $fn=min(128, $fn*2)) )
	togmod1_linear_extrude_z([0, 3.175], ["difference",
		togmod1_make_rounded_rect(actual_size, r=6),
		
		for( xm=[-grid_size_cells[0]/2+0.5 : 1 : grid_size_cells[0]/2-0.4] )
		for( ym=[-grid_size_cells[1]/2+0.5 : 1 : grid_size_cells[1]/2-0.4] )
		["translate", [xm,ym]*cell_size, netpot_hole]
	]);

togmod1_domodule(
	let( panel_size_ca = [for(a=panel_size_atoms) [a, "atom"]] )
	netpotpanel0_make_panel(panel_size_ca, panel_margin=panel_margin, thickness=panel_thickness)
);
